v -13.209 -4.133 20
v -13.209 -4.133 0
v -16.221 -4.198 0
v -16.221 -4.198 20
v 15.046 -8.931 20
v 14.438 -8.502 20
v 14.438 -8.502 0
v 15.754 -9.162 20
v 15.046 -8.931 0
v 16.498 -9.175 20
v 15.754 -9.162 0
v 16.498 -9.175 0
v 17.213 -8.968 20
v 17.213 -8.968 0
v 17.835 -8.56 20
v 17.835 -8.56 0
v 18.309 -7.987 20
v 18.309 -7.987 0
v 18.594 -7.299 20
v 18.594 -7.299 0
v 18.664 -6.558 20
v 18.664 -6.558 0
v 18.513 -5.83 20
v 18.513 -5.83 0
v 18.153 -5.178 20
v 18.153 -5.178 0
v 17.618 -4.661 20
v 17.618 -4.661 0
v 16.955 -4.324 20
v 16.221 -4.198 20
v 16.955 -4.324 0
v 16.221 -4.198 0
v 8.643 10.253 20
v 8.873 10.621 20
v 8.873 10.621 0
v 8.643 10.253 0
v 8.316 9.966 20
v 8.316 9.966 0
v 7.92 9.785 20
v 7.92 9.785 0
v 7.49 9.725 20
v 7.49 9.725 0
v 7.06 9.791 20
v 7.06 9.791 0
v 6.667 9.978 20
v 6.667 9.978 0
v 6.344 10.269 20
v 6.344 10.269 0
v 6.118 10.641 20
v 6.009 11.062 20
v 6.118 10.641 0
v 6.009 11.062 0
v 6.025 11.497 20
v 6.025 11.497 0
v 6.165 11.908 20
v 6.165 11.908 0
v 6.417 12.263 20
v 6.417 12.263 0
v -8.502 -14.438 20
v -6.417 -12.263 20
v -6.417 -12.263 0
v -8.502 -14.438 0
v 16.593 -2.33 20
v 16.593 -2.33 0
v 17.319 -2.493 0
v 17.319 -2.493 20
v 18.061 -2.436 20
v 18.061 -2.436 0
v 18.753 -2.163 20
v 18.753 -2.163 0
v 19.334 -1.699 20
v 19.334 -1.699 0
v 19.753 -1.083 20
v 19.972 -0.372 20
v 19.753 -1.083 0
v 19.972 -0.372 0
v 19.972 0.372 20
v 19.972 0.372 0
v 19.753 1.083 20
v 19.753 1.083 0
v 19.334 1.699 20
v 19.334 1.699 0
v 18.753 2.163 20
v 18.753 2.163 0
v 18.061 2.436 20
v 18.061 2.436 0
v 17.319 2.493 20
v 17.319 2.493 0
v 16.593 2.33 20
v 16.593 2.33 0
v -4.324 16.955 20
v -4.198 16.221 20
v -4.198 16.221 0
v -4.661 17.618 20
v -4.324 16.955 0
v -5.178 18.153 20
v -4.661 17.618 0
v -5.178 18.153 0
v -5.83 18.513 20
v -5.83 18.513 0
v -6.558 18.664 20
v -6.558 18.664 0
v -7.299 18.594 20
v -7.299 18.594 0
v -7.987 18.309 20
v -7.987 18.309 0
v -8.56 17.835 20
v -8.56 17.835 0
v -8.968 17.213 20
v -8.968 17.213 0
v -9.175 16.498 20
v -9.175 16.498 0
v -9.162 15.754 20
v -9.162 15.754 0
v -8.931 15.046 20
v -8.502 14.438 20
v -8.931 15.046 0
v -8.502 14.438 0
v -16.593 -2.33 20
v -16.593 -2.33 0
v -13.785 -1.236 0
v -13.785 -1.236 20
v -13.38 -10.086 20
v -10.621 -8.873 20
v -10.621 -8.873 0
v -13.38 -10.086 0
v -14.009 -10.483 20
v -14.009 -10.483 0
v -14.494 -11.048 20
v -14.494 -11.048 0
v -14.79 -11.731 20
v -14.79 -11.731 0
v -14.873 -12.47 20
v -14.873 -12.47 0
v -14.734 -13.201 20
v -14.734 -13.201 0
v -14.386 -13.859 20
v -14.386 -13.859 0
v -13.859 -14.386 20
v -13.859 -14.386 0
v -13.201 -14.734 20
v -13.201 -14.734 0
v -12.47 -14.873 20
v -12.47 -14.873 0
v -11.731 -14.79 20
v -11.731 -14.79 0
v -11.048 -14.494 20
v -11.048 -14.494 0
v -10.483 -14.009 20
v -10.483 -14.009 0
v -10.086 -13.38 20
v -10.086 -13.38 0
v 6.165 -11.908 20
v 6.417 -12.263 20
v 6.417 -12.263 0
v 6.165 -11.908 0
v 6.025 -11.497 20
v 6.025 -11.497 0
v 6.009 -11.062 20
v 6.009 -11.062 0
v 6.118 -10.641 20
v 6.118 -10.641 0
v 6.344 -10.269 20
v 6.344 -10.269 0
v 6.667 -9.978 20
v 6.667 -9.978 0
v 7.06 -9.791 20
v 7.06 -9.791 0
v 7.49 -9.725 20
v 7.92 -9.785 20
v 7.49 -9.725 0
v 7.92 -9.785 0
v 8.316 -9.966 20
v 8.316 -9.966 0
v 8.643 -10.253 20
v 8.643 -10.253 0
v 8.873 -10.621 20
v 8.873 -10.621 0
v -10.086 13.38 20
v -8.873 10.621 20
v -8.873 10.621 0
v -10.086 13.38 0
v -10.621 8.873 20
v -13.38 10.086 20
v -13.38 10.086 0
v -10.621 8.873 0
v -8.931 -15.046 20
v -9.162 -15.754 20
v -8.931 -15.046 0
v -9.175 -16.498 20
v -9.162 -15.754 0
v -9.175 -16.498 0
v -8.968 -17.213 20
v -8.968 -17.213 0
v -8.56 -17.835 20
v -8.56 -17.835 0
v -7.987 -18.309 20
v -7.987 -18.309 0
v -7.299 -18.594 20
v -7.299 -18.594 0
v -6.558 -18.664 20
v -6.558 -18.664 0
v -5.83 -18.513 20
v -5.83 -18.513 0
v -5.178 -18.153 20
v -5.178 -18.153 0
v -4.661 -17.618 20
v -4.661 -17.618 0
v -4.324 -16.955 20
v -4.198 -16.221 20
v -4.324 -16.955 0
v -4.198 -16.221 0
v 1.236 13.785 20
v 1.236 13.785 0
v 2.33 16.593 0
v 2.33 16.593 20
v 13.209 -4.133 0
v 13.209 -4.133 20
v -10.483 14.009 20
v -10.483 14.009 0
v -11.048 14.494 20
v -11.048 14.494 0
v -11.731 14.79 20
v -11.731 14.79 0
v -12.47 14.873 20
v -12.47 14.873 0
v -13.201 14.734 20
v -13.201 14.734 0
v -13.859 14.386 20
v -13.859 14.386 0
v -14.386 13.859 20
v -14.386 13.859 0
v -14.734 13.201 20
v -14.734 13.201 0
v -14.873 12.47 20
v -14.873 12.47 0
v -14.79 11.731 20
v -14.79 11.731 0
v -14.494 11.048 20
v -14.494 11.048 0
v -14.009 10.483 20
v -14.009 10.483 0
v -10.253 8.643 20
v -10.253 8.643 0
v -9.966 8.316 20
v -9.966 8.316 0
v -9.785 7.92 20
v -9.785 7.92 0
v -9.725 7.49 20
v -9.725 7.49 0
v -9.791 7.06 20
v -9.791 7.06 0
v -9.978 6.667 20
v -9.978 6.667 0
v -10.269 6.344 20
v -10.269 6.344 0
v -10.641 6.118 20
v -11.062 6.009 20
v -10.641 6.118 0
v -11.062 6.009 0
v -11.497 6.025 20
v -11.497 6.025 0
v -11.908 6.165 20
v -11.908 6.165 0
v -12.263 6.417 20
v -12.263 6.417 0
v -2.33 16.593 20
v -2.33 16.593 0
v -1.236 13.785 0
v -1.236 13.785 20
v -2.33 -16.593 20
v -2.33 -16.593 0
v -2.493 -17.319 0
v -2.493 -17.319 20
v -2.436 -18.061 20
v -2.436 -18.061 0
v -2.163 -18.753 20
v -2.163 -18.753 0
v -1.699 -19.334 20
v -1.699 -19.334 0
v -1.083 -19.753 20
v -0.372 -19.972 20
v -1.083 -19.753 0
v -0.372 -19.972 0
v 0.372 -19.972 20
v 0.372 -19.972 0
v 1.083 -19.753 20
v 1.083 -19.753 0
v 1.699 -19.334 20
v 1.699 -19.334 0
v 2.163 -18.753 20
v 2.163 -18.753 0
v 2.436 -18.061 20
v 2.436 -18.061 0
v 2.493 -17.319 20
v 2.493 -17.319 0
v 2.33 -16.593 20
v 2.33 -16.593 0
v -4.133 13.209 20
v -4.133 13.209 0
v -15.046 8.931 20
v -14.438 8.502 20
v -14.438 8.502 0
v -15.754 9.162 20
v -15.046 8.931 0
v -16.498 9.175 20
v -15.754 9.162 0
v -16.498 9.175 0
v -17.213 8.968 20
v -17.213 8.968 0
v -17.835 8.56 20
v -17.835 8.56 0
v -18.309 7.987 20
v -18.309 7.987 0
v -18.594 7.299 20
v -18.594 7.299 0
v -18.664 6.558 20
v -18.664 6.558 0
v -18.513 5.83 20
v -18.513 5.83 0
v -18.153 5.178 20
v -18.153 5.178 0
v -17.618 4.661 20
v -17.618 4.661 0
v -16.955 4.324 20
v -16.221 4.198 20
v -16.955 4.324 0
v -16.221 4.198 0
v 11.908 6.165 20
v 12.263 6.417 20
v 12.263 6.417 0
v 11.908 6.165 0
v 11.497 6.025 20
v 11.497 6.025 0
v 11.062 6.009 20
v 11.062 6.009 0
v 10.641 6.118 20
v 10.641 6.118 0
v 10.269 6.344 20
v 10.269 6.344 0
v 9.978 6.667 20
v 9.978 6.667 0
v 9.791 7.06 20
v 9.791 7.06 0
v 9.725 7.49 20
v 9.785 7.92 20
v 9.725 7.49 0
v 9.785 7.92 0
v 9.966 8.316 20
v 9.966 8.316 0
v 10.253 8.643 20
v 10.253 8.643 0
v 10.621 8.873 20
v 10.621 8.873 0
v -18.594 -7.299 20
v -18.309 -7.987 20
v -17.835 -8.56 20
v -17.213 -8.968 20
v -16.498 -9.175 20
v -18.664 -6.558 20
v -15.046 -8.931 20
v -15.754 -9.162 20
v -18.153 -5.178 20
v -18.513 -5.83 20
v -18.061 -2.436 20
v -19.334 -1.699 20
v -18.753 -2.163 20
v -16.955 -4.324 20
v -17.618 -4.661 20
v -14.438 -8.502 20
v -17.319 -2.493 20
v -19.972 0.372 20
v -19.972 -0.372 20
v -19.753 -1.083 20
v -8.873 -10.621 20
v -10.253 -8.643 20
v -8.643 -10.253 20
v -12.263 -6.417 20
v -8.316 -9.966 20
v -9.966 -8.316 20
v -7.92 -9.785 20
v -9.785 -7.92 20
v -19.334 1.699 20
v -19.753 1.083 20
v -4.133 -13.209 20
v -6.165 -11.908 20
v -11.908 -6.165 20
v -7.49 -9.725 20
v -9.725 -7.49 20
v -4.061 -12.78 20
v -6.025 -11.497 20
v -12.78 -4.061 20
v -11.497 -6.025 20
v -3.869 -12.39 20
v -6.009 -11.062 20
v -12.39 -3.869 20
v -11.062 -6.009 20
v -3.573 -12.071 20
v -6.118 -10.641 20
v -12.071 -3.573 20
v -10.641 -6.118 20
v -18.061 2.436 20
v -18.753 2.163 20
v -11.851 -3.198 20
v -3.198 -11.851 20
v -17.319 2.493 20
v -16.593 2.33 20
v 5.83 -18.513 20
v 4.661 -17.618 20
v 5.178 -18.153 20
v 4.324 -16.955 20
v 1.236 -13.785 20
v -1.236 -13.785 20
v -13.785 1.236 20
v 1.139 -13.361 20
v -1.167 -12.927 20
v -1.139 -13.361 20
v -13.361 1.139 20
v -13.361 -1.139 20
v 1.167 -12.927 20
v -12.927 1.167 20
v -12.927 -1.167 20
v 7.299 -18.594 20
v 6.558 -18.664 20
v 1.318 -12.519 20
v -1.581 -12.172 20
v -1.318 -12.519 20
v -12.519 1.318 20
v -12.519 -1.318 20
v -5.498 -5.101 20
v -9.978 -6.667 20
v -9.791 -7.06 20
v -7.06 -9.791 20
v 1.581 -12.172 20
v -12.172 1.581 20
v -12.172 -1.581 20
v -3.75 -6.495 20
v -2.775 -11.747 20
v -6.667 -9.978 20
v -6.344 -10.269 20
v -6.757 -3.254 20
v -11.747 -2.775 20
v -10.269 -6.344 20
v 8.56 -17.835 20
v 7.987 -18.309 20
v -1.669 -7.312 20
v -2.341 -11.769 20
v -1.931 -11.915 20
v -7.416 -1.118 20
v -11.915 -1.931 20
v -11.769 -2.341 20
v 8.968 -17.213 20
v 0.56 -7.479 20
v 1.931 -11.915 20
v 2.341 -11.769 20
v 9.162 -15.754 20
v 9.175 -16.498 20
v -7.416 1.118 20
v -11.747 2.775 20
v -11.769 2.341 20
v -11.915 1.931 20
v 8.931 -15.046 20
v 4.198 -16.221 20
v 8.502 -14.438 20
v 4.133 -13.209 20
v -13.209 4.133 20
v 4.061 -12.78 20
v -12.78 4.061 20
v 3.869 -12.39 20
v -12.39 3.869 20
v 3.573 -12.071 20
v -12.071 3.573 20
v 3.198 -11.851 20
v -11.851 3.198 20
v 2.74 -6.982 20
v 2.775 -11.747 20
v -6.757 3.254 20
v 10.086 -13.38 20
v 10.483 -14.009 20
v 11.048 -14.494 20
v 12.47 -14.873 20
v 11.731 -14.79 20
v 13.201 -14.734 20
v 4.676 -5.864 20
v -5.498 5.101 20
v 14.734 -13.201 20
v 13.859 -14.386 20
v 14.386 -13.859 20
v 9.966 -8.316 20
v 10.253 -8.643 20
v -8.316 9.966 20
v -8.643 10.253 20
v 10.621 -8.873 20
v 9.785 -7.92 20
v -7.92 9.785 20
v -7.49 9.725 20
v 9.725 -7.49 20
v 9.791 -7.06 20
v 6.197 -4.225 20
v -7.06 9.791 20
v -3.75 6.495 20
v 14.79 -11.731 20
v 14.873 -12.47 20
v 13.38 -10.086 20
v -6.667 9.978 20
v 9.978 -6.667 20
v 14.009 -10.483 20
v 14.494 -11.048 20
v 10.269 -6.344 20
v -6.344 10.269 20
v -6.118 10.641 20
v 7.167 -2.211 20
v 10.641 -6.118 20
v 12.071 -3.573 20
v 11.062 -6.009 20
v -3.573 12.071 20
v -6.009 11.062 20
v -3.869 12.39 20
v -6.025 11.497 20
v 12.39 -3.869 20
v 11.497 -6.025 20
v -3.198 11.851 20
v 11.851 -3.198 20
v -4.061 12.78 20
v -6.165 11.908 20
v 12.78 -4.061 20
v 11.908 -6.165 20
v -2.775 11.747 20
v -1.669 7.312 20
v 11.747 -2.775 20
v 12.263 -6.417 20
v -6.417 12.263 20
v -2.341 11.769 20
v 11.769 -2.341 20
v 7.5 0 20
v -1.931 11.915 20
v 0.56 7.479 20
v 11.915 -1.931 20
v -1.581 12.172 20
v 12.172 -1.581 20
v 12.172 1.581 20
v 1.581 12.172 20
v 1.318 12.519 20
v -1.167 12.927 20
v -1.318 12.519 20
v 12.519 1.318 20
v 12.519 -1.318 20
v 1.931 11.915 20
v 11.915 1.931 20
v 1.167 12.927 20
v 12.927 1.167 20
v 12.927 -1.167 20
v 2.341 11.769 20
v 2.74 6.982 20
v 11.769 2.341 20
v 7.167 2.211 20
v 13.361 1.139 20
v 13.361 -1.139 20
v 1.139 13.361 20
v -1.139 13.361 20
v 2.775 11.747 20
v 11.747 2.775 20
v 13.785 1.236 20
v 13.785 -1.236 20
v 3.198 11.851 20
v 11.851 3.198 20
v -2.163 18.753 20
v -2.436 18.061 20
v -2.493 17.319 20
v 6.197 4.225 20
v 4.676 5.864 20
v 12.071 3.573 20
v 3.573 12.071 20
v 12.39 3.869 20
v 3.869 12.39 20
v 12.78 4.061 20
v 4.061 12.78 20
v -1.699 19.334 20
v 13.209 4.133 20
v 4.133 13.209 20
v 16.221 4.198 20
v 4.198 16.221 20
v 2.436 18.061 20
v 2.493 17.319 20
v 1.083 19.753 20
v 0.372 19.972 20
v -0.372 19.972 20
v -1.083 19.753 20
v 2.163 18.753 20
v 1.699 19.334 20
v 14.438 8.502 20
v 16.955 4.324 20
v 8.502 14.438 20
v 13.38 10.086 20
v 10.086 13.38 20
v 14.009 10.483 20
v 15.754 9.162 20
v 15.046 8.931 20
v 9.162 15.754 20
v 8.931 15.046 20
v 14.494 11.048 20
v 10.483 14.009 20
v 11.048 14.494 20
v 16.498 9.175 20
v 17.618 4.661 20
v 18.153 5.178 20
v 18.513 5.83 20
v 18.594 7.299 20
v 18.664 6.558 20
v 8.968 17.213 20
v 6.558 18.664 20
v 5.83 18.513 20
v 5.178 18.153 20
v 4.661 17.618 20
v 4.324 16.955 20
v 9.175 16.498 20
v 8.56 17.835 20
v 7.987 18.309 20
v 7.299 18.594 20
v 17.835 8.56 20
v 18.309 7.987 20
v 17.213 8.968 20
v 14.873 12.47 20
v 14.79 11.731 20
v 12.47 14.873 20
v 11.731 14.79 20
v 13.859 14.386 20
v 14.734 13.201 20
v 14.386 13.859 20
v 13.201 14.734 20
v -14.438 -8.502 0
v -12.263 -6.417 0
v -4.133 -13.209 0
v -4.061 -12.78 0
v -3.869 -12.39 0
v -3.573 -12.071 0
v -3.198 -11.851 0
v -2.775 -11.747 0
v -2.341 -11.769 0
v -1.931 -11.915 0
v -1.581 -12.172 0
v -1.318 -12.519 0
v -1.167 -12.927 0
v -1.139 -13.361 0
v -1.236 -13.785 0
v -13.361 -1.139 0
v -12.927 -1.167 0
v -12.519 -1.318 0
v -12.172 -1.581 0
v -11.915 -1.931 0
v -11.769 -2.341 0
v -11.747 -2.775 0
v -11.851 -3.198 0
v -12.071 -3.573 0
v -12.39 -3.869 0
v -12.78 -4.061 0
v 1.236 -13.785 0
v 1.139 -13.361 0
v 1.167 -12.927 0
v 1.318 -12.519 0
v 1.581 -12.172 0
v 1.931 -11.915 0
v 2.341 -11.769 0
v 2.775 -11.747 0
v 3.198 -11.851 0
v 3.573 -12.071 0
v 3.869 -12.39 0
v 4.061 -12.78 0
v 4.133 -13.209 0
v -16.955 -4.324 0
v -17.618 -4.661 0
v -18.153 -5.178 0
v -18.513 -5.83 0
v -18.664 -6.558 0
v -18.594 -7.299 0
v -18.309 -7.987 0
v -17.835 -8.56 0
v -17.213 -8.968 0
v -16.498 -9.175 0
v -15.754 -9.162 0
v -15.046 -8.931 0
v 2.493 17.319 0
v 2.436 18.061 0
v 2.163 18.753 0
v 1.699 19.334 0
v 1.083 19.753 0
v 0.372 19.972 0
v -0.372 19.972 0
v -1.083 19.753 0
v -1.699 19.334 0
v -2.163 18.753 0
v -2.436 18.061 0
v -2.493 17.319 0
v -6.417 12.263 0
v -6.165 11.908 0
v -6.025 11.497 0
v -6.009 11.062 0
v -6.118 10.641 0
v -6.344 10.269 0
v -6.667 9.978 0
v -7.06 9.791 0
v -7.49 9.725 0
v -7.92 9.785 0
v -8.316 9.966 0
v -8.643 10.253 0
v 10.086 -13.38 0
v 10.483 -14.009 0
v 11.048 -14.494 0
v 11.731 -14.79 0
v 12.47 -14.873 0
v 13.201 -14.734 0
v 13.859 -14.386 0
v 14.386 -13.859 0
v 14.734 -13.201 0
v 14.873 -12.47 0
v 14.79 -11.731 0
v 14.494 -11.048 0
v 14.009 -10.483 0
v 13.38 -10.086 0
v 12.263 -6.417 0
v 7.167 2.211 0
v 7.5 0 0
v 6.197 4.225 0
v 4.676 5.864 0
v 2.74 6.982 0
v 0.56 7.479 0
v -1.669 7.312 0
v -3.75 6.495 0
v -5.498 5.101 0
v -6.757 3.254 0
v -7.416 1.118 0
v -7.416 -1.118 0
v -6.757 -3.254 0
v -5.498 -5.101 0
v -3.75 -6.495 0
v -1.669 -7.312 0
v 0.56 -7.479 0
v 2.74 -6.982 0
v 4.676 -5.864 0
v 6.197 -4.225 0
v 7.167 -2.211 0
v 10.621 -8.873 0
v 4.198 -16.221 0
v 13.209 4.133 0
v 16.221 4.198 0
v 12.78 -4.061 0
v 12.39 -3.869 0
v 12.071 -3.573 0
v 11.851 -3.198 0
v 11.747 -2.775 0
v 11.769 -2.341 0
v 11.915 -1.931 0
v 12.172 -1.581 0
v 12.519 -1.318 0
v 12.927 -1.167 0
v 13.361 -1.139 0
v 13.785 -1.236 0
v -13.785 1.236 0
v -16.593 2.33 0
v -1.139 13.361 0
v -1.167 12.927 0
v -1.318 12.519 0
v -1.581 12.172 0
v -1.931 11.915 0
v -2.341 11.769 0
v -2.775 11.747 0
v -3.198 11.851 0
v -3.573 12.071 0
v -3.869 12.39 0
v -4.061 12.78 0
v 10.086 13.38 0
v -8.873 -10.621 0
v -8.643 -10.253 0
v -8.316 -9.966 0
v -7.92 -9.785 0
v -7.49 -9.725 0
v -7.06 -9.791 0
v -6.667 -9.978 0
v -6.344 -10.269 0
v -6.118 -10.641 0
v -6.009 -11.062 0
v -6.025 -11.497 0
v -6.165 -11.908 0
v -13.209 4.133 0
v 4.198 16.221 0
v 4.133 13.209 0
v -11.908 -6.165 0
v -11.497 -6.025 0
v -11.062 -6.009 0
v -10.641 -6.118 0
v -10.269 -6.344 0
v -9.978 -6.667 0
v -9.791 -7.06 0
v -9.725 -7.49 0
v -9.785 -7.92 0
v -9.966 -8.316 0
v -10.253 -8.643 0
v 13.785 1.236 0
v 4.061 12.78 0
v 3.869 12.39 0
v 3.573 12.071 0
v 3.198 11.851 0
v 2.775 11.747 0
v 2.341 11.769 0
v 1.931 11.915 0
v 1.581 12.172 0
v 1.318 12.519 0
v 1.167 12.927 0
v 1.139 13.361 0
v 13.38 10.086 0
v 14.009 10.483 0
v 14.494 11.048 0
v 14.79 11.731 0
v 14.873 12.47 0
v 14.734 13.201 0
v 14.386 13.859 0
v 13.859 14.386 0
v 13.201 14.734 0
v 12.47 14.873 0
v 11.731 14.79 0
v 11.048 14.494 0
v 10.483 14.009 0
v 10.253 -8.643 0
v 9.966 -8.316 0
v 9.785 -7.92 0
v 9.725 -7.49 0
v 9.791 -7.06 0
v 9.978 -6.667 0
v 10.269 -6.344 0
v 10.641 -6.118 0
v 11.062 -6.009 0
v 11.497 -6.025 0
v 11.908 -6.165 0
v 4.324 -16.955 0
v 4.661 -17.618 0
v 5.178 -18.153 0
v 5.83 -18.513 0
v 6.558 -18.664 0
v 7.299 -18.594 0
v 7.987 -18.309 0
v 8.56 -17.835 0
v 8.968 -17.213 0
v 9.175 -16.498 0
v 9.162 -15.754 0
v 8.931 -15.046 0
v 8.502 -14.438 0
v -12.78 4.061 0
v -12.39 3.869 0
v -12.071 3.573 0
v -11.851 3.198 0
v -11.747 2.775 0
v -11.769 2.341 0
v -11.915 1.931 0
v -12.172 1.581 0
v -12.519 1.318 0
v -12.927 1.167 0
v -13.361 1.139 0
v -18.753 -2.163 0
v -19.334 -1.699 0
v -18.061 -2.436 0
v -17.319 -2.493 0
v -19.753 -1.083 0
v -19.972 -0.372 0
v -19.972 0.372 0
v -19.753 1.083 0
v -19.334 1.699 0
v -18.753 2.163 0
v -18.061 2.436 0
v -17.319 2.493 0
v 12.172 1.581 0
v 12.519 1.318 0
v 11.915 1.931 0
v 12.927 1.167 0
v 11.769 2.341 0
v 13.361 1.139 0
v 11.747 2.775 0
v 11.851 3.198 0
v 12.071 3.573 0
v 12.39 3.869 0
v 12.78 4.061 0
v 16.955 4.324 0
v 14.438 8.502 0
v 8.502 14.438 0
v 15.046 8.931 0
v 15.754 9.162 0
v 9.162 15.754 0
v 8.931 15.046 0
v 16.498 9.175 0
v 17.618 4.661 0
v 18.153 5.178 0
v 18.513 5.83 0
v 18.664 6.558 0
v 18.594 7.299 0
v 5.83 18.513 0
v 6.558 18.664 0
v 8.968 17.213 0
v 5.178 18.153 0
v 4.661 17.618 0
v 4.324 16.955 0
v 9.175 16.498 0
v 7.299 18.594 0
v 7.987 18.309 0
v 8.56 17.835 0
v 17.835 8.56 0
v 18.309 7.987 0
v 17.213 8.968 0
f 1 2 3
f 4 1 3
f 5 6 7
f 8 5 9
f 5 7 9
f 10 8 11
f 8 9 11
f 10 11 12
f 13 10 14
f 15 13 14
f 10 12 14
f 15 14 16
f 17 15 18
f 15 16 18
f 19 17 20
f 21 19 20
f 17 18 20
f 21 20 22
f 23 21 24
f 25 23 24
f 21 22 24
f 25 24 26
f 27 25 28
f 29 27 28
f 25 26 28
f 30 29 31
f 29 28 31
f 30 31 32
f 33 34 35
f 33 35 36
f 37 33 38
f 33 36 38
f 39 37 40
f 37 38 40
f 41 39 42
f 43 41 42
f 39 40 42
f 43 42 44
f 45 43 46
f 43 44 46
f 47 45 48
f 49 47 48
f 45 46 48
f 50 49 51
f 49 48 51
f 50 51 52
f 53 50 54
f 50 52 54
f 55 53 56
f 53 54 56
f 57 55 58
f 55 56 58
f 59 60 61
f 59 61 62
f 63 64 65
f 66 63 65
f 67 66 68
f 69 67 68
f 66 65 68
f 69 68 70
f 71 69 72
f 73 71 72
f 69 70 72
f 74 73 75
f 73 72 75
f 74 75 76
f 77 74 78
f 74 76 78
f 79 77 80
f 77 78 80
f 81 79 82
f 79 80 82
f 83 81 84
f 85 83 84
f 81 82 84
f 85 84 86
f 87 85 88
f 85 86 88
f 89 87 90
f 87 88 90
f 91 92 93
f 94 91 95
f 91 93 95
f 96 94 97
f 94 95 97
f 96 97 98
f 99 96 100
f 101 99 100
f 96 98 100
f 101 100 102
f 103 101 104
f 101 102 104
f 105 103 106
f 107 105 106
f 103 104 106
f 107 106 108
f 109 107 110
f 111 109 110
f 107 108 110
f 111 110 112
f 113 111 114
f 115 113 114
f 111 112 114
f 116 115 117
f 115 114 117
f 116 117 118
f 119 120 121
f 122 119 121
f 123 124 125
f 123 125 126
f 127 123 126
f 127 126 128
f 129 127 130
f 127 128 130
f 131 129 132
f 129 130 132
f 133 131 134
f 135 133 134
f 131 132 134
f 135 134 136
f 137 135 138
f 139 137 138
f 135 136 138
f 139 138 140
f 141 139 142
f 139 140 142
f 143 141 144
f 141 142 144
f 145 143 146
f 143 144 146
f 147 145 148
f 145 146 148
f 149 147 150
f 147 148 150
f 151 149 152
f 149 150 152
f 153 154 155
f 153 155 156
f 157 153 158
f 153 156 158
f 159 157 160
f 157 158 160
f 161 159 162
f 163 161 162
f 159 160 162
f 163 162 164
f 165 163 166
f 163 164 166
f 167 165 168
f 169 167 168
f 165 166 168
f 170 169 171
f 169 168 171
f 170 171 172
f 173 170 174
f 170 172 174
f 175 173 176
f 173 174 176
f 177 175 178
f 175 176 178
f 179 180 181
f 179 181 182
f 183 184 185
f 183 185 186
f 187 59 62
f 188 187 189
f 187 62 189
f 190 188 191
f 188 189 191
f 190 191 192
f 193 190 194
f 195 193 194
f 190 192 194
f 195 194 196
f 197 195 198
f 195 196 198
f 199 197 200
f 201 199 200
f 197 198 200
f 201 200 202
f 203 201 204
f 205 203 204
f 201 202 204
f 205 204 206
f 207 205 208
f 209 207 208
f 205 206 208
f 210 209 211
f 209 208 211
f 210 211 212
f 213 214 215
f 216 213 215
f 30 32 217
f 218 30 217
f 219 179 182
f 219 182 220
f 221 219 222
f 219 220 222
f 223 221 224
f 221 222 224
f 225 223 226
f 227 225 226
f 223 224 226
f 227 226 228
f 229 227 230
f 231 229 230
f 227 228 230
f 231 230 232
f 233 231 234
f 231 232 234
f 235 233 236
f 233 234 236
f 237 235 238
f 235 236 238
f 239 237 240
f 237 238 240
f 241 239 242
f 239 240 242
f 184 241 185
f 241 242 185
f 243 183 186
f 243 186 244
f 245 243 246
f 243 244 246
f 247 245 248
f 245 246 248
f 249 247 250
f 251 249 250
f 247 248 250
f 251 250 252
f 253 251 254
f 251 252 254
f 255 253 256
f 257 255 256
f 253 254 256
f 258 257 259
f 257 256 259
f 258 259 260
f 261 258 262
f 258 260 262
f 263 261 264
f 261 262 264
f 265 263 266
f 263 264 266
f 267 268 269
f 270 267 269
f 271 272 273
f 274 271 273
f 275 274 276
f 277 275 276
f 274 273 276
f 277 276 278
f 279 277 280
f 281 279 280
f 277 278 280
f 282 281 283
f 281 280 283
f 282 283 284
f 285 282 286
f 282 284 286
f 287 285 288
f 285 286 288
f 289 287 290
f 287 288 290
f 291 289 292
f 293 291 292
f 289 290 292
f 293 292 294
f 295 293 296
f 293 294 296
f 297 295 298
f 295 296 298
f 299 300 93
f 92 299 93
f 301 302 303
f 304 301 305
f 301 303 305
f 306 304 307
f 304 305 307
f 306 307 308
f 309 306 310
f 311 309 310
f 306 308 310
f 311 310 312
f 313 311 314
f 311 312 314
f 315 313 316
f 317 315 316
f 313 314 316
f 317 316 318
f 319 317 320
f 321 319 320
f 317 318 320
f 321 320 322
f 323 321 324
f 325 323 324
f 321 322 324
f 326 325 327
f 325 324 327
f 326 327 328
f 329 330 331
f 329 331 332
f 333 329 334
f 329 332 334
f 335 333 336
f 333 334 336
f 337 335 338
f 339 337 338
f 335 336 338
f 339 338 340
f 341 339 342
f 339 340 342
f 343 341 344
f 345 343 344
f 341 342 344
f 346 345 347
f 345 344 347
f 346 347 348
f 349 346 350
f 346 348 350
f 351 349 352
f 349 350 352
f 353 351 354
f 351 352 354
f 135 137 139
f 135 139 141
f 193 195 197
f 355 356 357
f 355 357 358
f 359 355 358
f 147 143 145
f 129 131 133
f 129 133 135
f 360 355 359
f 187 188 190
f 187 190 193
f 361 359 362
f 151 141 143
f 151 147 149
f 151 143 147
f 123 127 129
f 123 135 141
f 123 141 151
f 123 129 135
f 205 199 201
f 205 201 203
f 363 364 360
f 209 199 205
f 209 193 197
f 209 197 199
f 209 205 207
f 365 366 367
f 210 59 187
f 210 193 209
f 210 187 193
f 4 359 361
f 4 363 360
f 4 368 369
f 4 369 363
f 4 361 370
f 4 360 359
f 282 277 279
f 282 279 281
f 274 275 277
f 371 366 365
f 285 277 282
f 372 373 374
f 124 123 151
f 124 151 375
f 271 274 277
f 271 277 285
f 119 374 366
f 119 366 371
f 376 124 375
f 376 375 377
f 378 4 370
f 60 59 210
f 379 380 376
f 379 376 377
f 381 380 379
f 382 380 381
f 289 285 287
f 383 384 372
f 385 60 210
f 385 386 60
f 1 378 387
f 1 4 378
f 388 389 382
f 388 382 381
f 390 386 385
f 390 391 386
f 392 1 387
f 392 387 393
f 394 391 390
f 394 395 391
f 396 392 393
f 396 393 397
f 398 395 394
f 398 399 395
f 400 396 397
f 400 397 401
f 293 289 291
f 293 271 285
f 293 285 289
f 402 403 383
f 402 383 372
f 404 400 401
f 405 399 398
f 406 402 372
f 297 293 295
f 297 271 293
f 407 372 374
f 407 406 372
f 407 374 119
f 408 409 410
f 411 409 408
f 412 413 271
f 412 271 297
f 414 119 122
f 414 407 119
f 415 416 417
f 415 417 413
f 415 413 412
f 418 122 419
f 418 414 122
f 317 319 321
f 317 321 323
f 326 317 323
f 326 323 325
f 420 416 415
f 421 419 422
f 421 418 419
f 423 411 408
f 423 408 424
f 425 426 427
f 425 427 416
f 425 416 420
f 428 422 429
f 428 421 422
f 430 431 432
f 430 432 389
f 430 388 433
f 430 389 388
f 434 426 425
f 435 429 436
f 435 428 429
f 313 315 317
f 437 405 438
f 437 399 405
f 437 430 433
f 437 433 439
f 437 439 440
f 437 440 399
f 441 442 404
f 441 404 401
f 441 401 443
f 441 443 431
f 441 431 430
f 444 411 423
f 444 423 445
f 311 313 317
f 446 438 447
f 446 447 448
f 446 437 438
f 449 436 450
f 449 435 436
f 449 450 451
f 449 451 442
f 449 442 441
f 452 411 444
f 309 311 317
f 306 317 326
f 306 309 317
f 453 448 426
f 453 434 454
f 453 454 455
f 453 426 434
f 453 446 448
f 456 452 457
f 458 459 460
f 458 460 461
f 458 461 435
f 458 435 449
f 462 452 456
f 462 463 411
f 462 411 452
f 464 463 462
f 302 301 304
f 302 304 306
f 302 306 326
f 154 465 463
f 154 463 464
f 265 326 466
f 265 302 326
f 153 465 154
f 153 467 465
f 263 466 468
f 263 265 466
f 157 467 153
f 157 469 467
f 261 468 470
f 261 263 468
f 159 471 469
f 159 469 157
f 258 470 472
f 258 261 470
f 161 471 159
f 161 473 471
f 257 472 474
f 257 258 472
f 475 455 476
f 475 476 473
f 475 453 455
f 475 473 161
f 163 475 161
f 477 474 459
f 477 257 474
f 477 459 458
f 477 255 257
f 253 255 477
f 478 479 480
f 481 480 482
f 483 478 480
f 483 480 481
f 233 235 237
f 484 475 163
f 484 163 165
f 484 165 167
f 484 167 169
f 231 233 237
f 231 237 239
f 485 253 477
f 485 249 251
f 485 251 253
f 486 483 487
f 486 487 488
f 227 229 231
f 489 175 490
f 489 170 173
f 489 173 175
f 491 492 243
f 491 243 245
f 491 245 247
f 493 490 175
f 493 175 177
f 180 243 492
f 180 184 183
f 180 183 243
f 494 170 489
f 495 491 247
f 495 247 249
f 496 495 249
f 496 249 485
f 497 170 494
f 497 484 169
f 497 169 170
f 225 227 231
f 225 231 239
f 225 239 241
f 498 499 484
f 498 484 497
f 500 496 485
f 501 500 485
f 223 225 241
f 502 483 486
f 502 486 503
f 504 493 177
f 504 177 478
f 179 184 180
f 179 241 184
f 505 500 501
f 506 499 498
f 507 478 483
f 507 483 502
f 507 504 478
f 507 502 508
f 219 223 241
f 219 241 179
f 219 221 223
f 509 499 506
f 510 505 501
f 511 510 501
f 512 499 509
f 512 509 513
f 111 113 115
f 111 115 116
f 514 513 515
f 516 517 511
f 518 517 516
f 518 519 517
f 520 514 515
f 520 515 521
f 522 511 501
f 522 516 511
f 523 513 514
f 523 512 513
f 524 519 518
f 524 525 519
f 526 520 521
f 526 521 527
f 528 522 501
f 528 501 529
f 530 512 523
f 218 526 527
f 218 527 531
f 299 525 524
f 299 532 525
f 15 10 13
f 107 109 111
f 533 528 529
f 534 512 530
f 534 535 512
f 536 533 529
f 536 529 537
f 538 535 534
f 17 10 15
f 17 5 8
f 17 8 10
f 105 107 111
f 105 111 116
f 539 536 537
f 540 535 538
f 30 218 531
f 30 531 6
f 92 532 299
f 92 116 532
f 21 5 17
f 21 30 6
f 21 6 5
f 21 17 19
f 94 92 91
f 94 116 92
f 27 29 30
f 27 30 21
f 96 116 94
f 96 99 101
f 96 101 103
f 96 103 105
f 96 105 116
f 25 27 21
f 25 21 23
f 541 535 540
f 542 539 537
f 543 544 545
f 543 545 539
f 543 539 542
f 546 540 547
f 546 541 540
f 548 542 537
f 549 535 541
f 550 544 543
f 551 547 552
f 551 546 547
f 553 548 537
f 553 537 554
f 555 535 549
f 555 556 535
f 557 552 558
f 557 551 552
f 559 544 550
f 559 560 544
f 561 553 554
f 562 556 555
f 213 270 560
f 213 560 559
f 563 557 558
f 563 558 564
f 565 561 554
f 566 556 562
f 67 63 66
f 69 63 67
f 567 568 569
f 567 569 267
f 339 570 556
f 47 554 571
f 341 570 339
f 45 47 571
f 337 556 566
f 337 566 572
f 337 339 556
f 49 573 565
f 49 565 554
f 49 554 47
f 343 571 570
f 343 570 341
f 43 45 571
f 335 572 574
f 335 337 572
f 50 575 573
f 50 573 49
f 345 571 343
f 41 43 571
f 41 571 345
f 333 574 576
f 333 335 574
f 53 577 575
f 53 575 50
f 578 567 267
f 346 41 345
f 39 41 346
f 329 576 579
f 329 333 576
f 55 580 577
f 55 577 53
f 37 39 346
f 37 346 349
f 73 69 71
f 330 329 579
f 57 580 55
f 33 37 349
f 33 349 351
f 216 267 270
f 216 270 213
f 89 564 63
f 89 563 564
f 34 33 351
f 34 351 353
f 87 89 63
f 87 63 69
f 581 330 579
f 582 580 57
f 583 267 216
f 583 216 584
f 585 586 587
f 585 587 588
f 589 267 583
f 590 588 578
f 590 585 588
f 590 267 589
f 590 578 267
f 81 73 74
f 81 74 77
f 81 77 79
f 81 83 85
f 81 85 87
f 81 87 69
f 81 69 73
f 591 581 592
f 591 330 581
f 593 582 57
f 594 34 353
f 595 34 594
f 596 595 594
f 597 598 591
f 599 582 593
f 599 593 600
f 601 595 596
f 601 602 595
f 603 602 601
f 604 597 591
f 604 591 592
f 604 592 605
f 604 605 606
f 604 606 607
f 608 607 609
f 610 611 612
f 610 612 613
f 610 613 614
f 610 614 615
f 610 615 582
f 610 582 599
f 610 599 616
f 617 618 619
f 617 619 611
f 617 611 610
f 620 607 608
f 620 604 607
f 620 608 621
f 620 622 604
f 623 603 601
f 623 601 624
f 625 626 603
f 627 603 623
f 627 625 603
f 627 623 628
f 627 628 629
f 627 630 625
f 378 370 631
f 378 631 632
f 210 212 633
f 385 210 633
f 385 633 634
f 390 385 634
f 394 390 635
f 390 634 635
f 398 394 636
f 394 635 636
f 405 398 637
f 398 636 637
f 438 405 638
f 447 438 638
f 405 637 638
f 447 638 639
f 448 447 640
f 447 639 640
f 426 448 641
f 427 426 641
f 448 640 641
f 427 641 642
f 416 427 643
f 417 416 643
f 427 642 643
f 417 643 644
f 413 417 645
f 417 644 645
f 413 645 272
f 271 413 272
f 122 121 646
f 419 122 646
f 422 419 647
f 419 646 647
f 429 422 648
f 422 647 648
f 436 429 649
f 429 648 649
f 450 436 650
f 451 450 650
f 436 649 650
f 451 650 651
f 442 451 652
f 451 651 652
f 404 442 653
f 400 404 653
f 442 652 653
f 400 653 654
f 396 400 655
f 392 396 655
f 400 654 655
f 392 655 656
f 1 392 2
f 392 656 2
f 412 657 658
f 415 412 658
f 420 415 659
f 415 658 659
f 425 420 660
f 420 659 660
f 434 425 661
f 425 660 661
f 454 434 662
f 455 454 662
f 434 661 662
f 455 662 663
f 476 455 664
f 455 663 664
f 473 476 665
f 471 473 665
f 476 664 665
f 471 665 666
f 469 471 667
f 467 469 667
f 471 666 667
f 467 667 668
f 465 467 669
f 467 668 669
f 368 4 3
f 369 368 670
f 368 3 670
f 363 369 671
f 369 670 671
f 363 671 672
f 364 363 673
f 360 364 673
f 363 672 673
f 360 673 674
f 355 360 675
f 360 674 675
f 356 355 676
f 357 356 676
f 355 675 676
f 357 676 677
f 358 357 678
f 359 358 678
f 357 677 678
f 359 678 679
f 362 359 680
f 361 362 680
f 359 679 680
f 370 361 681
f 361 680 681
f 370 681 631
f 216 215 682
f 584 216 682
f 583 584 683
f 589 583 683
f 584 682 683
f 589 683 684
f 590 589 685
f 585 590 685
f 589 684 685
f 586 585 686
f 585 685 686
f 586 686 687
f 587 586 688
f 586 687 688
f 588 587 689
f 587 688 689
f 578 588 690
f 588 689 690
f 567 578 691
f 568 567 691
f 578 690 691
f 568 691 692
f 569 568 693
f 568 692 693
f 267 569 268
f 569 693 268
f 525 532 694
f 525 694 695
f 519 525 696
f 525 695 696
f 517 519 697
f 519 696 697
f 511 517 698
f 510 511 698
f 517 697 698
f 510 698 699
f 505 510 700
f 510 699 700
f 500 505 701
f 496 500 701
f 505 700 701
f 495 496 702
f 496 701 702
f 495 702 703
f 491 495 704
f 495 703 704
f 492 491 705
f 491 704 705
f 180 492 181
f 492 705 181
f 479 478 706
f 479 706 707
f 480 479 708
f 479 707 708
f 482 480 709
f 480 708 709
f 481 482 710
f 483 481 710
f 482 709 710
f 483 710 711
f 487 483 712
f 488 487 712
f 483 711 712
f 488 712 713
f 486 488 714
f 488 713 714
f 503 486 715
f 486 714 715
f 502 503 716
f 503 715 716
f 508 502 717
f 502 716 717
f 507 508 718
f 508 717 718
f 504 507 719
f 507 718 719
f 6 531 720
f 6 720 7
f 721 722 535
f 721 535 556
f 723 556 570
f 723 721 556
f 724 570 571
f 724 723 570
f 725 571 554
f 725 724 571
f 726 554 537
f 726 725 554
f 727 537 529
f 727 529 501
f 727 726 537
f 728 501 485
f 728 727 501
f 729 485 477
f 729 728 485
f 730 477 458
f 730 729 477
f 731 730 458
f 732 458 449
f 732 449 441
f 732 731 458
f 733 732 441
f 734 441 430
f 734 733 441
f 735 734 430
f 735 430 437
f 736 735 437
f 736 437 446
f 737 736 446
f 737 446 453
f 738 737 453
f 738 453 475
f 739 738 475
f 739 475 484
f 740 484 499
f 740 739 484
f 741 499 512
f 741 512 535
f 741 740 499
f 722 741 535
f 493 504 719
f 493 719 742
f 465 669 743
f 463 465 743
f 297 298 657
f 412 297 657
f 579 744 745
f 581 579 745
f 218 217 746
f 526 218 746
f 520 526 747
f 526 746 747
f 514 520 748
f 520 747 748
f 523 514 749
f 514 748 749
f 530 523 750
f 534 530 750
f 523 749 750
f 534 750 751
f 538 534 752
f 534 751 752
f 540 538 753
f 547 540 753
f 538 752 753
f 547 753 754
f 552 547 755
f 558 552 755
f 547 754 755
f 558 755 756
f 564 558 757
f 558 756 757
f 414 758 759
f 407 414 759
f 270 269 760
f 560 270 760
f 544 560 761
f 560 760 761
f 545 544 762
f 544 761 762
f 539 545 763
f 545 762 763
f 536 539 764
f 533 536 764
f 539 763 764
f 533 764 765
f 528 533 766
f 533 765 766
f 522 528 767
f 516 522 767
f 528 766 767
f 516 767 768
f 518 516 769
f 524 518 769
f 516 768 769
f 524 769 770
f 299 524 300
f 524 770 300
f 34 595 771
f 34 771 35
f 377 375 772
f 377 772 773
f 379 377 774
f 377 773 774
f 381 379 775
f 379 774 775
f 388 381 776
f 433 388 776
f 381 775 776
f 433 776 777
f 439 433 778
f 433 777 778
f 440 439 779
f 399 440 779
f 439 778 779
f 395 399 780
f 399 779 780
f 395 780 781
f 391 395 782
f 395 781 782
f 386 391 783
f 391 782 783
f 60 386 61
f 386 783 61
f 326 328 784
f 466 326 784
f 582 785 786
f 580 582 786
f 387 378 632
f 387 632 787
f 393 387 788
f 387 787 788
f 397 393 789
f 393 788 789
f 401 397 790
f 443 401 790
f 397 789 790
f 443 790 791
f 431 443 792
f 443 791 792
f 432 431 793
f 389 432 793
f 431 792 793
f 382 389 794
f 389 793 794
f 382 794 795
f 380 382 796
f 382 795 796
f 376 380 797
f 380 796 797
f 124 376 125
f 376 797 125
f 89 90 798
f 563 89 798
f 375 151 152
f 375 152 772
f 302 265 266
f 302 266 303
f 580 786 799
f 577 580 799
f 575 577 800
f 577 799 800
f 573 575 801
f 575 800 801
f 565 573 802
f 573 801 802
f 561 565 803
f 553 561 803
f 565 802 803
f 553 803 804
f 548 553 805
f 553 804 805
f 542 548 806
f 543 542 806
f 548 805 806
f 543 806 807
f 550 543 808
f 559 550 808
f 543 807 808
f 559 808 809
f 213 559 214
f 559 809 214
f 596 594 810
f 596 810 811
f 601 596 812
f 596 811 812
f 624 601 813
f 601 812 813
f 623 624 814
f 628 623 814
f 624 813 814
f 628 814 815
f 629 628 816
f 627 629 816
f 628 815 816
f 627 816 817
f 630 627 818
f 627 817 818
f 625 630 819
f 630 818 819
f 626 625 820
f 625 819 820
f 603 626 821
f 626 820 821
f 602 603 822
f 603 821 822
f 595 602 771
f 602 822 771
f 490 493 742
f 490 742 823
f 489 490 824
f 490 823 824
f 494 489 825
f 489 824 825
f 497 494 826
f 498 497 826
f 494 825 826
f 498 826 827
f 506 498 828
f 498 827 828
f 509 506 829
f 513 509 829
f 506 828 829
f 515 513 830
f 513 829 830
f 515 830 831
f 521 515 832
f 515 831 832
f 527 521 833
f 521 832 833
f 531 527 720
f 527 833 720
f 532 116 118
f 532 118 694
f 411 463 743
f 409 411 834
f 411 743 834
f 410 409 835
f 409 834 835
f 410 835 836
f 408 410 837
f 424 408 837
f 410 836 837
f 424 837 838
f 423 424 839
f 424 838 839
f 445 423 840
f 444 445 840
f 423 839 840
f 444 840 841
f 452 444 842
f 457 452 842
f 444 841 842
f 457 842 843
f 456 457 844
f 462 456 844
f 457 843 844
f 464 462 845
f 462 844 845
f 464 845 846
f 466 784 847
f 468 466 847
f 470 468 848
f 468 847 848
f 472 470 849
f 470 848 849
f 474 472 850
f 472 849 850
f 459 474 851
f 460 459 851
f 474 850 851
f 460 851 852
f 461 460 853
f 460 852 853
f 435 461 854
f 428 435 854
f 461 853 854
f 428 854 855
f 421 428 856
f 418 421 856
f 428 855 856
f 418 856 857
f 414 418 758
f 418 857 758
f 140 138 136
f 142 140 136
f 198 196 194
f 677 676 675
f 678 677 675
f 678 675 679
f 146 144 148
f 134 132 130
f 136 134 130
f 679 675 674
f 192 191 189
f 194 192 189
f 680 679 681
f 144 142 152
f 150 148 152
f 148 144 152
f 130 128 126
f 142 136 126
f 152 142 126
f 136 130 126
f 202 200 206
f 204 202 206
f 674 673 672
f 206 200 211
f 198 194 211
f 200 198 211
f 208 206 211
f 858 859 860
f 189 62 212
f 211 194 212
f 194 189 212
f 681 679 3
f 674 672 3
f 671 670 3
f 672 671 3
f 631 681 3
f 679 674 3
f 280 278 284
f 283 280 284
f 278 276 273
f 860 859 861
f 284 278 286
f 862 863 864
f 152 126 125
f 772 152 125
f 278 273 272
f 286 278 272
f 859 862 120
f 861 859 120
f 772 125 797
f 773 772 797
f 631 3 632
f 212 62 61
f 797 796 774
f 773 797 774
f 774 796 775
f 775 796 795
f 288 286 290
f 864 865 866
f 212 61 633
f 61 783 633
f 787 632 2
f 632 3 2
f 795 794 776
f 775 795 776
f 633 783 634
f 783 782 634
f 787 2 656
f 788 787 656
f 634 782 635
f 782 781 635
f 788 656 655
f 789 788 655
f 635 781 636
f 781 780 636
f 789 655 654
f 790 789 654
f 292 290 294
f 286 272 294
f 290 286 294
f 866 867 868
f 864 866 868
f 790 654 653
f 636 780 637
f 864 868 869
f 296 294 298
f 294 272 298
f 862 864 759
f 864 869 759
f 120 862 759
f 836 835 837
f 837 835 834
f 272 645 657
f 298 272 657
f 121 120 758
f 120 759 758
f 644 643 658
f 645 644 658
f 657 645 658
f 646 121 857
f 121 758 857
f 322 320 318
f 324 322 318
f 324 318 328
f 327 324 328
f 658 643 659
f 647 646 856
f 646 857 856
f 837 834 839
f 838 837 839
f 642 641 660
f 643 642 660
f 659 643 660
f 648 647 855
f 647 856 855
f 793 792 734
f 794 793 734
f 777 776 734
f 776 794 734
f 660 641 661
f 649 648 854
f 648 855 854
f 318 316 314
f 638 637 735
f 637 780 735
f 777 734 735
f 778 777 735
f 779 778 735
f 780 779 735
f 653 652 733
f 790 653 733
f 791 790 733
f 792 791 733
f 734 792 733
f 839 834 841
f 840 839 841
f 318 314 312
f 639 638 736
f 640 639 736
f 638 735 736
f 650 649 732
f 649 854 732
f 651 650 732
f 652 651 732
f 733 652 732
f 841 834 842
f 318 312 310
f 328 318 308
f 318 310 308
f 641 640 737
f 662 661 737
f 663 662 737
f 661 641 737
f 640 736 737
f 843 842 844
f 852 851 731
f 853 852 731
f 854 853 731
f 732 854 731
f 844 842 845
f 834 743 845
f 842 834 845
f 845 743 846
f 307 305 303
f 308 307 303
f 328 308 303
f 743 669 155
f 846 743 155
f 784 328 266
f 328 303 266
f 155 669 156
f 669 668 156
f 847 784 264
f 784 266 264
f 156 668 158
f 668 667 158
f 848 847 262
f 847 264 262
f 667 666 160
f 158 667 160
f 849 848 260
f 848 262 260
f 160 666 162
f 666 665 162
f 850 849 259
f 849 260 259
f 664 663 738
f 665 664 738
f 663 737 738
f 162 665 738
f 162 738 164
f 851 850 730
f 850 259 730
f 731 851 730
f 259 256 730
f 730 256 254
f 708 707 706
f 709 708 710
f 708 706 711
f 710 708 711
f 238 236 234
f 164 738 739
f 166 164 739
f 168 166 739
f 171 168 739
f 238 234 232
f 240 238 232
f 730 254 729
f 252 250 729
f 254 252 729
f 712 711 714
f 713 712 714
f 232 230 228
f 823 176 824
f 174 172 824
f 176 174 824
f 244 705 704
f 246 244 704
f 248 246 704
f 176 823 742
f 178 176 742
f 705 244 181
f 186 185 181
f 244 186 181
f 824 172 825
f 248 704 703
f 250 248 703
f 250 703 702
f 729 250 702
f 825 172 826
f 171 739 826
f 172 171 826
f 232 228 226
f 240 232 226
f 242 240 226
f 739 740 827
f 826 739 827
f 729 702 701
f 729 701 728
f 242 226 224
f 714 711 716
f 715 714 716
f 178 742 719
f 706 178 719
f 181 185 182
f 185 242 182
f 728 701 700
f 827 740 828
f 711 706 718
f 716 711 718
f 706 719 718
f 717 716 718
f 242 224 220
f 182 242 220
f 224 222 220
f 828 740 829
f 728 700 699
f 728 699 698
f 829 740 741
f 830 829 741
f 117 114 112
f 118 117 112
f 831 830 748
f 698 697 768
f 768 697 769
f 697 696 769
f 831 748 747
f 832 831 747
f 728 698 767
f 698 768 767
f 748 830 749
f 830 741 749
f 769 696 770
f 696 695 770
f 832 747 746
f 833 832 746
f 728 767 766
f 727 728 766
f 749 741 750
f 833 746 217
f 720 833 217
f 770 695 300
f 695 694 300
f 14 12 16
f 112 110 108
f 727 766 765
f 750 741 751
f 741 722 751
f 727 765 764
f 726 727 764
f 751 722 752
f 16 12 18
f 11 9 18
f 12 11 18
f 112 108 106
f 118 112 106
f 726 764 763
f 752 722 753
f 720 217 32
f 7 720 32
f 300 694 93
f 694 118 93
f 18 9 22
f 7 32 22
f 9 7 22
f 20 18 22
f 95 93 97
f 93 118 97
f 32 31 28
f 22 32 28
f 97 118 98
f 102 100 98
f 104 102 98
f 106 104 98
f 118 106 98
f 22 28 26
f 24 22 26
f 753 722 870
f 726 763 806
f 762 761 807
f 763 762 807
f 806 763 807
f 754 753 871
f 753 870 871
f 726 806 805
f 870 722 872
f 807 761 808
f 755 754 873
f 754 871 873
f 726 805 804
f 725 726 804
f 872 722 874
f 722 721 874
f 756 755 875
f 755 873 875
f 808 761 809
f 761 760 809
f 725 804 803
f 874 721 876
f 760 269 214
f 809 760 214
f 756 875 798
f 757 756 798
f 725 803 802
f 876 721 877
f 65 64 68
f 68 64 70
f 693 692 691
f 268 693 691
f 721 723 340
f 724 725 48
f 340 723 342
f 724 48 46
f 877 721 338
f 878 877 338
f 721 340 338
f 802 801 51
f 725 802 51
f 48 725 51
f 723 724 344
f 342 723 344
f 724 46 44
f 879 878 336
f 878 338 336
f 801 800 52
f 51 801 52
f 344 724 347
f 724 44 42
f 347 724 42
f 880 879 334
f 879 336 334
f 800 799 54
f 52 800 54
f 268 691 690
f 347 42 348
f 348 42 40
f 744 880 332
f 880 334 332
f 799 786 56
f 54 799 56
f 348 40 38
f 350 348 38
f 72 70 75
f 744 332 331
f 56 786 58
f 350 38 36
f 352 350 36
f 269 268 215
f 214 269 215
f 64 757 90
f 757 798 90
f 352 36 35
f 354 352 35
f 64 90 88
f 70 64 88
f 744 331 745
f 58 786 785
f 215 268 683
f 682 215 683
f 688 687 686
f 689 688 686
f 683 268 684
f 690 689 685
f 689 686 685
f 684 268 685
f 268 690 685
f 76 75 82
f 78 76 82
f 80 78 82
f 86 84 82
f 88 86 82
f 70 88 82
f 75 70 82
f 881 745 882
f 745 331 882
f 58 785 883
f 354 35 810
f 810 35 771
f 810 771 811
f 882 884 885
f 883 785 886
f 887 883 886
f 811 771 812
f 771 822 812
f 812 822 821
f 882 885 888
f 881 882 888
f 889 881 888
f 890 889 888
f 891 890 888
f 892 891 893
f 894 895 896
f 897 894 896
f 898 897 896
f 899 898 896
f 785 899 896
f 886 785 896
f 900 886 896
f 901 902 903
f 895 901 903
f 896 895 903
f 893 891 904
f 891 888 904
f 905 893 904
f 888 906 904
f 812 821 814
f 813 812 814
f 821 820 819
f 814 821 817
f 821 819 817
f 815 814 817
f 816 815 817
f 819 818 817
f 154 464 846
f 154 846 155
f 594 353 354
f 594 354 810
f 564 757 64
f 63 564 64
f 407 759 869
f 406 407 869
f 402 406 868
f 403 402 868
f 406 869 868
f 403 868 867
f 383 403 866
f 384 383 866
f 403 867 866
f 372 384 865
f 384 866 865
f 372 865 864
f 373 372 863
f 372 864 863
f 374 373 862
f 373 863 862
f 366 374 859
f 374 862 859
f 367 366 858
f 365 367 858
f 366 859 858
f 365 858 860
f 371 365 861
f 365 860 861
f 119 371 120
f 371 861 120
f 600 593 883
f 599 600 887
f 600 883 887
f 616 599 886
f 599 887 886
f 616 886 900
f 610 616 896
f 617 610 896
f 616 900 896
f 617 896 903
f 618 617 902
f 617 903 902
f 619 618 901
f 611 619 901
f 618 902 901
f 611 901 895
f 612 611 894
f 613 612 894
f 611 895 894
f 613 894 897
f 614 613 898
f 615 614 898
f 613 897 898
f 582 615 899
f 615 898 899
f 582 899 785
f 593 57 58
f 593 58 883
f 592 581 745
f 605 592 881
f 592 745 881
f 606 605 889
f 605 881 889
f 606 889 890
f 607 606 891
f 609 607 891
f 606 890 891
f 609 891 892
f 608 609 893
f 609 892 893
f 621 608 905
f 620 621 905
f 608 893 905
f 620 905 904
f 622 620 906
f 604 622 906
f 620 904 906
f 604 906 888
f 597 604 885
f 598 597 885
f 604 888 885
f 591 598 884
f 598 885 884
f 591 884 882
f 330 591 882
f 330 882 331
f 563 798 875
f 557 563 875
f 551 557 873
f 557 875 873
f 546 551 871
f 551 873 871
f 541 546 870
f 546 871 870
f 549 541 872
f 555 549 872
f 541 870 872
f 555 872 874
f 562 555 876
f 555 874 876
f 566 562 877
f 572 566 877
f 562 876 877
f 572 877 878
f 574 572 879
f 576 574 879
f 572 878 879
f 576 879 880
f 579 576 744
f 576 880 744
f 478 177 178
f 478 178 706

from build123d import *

# Parameters (mm, degrees)
F0_R     = 7.5
F1_DEPTH = 20


with BuildPart() as f1:
    # F0 (on Top) → F1 (new body)
    with BuildSketch(Plane.XY):
        with BuildLine():
            Line((-13.784993, 1.235994), (-16.59268, 2.329543))
            ThreePointArc((-16.59268, 2.329543), (-20, 0), (-16.59268, -2.329543))
            Line((-16.59268, -2.329543), (-13.784993, -1.235994))
            ThreePointArc((-13.784993, -1.235994), (-11.769423, -2.341084), (-13.208667, -4.133379))
            Line((-13.208667, -4.133379), (-16.221115, -4.197527))
            ThreePointArc((-16.221115, -4.197527), (-18.477591, -7.653669), (-14.43816, -8.501961))
            Line((-14.43816, -8.501961), (-12.262679, -6.417198))
            ThreePointArc((-12.262679, -6.417198), (-9.977635, -6.666843), (-10.621442, -8.873483))
            Line((-10.621442, -8.873483), (-13.380032, -10.085561))
            ThreePointArc((-13.380032, -10.085561), (-14.142136, -14.142136), (-10.085561, -13.380032))
            Line((-10.085561, -13.380032), (-8.873483, -10.621442))
            ThreePointArc((-8.873483, -10.621442), (-6.666843, -9.977635), (-6.417198, -12.262679))
            Line((-6.417198, -12.262679), (-8.501961, -14.43816))
            ThreePointArc((-8.501961, -14.43816), (-7.653669, -18.477591), (-4.197527, -16.221115))
            Line((-4.197527, -16.221115), (-4.133379, -13.208667))
            ThreePointArc((-4.133379, -13.208667), (-2.341084, -11.769423), (-1.235994, -13.784993))
            Line((-1.235994, -13.784993), (-2.329543, -16.59268))
            ThreePointArc((-2.329543, -16.59268), (0, -20), (2.329543, -16.59268))
            Line((2.329543, -16.59268), (1.235994, -13.784993))
            ThreePointArc((1.235994, -13.784993), (2.341084, -11.769423), (4.133379, -13.208667))
            Line((4.133379, -13.208667), (4.197527, -16.221115))
            ThreePointArc((4.197527, -16.221115), (7.653669, -18.477591), (8.501961, -14.43816))
            Line((8.501961, -14.43816), (6.417198, -12.262679))
            ThreePointArc((6.417198, -12.262679), (6.666843, -9.977635), (8.873483, -10.621442))
            Line((8.873483, -10.621442), (10.085561, -13.380032))
            ThreePointArc((10.085561, -13.380032), (14.142136, -14.142136), (13.380032, -10.085561))
            Line((13.380032, -10.085561), (10.621442, -8.873483))
            ThreePointArc((10.621442, -8.873483), (9.977635, -6.666843), (12.262679, -6.417198))
            Line((12.262679, -6.417198), (14.43816, -8.501961))
            ThreePointArc((14.43816, -8.501961), (18.477591, -7.653669), (16.221115, -4.197527))
            Line((16.221115, -4.197527), (13.208667, -4.133379))
            ThreePointArc((13.208667, -4.133379), (11.769423, -2.341084), (13.784993, -1.235994))
            Line((13.784993, -1.235994), (16.59268, -2.329543))
            ThreePointArc((16.59268, -2.329543), (20, 0), (16.59268, 2.329543))
            Line((16.59268, 2.329543), (13.784993, 1.235994))
            ThreePointArc((13.784993, 1.235994), (11.769423, 2.341084), (13.208667, 4.133379))
            Line((13.208667, 4.133379), (16.221115, 4.197527))
            ThreePointArc((16.221115, 4.197527), (18.477591, 7.653669), (14.43816, 8.501961))
            Line((14.43816, 8.501961), (12.262679, 6.417198))
            ThreePointArc((12.262679, 6.417198), (9.977635, 6.666843), (10.621442, 8.873483))
            Line((10.621442, 8.873483), (13.380032, 10.085561))
            ThreePointArc((13.380032, 10.085561), (14.142136, 14.142136), (10.085561, 13.380032))
            Line((10.085561, 13.380032), (8.873483, 10.621442))
            ThreePointArc((8.873483, 10.621442), (6.666843, 9.977635), (6.417198, 12.262679))
            Line((6.417198, 12.262679), (8.501961, 14.43816))
            ThreePointArc((8.501961, 14.43816), (7.653669, 18.477591), (4.197527, 16.221115))
            Line((4.197527, 16.221115), (4.133379, 13.208667))
            ThreePointArc((4.133379, 13.208667), (2.341084, 11.769423), (1.235994, 13.784993))
            Line((1.235994, 13.784993), (2.329543, 16.59268))
            ThreePointArc((2.329543, 16.59268), (0, 20), (-2.329543, 16.59268))
            Line((-2.329543, 16.59268), (-1.235994, 13.784993))
            ThreePointArc((-1.235994, 13.784993), (-2.341084, 11.769423), (-4.133379, 13.208667))
            Line((-4.133379, 13.208667), (-4.197527, 16.221115))
            ThreePointArc((-4.197527, 16.221115), (-7.653669, 18.477591), (-8.501961, 14.43816))
            Line((-8.501961, 14.43816), (-6.417198, 12.262679))
            ThreePointArc((-6.417198, 12.262679), (-6.666843, 9.977635), (-8.873483, 10.621442))
            Line((-8.873483, 10.621442), (-10.085561, 13.380032))
            ThreePointArc((-10.085561, 13.380032), (-14.142136, 14.142136), (-13.380032, 10.085561))
            Line((-13.380032, 10.085561), (-10.621442, 8.873483))
            ThreePointArc((-10.621442, 8.873483), (-9.977635, 6.666843), (-12.262679, 6.417198))
            Line((-12.262679, 6.417198), (-14.43816, 8.501961))
            ThreePointArc((-14.43816, 8.501961), (-18.477591, 7.653669), (-16.221115, 4.197527))
            Line((-16.221115, 4.197527), (-13.208667, 4.133379))
            ThreePointArc((-13.208667, 4.133379), (-11.769423, 2.341084), (-13.784993, 1.235994))
        make_face()
        Circle(F0_R, mode=Mode.SUBTRACT)
    extrude(amount=F1_DEPTH)


solid = f1.part
